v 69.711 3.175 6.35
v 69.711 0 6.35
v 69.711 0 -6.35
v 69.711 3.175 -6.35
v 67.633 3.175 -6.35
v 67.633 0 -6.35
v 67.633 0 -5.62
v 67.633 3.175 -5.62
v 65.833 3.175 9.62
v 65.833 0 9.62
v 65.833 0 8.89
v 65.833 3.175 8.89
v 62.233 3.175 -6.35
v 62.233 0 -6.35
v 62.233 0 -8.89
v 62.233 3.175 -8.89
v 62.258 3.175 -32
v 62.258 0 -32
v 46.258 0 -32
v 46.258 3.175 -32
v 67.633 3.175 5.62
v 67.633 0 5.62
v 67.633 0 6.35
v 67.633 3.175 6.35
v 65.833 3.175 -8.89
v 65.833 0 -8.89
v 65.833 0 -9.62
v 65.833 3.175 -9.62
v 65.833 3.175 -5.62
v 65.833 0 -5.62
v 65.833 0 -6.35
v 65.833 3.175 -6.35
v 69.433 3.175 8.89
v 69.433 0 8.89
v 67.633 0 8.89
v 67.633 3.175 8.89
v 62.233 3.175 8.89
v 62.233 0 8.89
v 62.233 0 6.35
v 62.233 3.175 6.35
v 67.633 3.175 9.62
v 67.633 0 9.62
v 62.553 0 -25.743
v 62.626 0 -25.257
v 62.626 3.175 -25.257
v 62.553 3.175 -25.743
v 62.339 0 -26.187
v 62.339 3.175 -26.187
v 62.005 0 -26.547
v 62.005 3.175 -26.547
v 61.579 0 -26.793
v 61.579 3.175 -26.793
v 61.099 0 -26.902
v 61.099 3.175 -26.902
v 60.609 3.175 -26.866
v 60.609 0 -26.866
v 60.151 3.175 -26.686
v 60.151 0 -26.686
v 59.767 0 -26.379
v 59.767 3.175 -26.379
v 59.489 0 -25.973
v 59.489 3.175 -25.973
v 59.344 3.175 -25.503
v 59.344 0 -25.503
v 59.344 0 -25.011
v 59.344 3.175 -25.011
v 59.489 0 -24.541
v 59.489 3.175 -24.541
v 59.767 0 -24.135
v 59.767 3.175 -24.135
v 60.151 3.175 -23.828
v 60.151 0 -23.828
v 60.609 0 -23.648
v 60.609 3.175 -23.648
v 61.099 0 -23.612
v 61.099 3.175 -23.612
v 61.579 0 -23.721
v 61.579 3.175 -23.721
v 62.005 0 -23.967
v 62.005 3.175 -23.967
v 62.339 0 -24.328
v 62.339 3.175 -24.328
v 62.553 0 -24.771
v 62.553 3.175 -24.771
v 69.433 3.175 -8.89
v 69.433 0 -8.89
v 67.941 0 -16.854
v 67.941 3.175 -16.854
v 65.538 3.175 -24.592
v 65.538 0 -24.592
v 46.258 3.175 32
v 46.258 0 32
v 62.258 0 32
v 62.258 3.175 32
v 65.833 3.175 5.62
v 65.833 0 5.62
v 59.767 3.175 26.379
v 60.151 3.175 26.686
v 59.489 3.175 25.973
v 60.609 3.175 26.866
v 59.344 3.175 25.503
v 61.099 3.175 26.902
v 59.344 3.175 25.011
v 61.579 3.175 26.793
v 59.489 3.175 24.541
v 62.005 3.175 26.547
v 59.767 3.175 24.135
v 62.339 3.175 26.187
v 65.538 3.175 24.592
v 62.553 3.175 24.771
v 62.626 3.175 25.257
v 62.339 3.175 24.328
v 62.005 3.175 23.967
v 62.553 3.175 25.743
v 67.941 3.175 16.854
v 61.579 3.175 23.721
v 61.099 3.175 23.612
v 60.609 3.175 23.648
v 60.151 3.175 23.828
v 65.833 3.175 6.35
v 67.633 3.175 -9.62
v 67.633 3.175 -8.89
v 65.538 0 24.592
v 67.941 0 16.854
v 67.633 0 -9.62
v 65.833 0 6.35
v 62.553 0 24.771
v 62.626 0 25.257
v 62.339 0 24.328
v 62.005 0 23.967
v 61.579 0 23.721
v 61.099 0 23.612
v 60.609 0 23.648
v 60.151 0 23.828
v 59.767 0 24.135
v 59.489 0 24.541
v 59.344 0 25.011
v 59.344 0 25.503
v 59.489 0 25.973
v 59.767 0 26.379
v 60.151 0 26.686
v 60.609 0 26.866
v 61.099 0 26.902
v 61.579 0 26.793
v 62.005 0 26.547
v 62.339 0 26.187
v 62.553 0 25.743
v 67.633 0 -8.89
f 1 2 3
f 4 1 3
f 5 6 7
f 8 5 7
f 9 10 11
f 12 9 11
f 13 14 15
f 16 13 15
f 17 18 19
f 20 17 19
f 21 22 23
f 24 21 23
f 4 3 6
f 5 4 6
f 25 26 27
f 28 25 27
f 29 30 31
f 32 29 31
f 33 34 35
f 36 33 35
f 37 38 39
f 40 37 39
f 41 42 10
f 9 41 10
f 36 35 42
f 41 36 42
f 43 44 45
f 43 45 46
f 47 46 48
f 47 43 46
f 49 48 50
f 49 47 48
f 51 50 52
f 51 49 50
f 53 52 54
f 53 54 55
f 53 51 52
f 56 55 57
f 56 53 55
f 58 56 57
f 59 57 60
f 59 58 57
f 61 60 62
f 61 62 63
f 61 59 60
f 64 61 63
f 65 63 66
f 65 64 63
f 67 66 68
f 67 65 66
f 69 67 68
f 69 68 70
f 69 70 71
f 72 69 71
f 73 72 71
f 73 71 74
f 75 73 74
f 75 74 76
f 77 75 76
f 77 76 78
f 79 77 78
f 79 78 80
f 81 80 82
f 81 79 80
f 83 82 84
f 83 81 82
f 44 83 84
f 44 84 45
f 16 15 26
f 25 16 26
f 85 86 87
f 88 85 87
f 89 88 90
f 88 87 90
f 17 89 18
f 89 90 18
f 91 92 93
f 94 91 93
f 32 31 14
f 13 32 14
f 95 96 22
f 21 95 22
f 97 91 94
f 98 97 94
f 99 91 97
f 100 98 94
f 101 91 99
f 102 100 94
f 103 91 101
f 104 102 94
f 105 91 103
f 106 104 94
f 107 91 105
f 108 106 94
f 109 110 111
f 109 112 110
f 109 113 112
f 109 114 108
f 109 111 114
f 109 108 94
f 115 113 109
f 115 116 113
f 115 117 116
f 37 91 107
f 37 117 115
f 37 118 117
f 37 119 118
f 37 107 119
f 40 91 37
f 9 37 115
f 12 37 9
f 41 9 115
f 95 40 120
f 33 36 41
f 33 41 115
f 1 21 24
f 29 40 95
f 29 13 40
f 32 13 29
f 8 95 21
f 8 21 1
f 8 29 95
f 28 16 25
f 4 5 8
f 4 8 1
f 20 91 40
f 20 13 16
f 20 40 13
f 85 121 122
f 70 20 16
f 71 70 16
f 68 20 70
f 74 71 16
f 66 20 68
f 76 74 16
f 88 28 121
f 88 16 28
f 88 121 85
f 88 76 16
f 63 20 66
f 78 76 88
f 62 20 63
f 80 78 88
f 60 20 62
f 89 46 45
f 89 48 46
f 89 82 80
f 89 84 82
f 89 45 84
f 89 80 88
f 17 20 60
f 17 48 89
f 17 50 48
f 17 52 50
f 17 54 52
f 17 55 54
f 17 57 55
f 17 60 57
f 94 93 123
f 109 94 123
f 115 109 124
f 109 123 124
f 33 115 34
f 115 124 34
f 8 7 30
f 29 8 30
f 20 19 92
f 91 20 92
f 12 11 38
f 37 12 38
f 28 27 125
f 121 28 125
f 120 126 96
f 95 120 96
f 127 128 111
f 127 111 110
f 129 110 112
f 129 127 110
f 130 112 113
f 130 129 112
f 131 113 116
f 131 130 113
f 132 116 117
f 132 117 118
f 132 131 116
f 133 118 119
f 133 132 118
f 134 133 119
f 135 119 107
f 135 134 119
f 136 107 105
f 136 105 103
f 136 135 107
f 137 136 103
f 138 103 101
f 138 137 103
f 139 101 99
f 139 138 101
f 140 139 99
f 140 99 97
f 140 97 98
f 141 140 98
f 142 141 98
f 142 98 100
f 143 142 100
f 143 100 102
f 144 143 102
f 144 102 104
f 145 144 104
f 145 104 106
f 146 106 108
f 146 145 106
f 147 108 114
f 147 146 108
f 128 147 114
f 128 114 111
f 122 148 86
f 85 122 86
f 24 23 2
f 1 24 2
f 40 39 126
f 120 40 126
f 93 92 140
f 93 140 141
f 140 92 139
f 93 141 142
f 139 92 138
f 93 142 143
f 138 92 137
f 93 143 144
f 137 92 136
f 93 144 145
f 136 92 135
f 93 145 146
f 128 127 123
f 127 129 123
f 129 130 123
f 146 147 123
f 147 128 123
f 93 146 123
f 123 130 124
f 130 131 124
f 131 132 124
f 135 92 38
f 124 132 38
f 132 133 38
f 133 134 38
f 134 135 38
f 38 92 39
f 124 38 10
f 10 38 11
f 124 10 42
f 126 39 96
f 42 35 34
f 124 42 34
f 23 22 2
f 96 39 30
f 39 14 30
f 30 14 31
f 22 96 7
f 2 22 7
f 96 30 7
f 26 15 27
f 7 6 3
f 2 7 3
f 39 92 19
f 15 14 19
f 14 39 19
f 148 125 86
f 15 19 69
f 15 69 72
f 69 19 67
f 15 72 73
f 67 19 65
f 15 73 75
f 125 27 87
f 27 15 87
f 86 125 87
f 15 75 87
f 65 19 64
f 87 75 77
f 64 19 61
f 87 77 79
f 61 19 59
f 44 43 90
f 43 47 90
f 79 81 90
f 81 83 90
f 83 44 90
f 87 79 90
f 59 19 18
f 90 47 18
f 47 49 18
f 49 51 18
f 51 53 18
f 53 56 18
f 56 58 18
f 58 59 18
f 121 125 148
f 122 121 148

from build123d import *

# Parameters (mm, degrees)
SKETCH1_R           = 1.65
BOSS_EXTRUDE1_DEPTH = 3.175


with BuildPart() as part:
    # Sketch1 → Boss-Extrude1 (new body)
    with BuildSketch(Plane(origin=(0, 0, 0), x_dir=(1, 0, 0), z_dir=(0, 1, 0))):
        with BuildLine():
            Line((62.257529665, 32), (46.257529665, 32))
            Line((46.257529665, 32), (46.257529665, -32))
            Line((46.257529665, -32), (62.257529665, -32))
            ThreePointArc((62.257529665, -32), (66.851547843, -20.757421588), (69.43319019, -8.89))
            Line((69.43319019, -8.89), (67.63319019, -8.89))
            Line((67.63319019, -8.89), (67.63319019, -9.62))
            Line((67.63319019, -9.62), (65.83319019, -9.62))
            Line((65.83319019, -9.62), (65.83319019, -8.89))
            Line((65.83319019, -8.89), (62.23319019, -8.89))
            Line((62.23319019, -8.89), (62.23319019, -6.35))
            Line((62.23319019, -6.35), (65.83319019, -6.35))
            Line((65.83319019, -6.35), (65.83319019, -5.62))
            Line((65.83319019, -5.62), (67.63319019, -5.62))
            Line((67.63319019, -5.62), (67.63319019, -6.35))
            Line((67.63319019, -6.35), (69.711387162, -6.35))
            Line((69.711387162, -6.35), (69.711387162, 6.35))
            Line((69.711387162, 6.35), (67.63319019, 6.35))
            Line((67.63319019, 6.35), (67.63319019, 5.62))
            Line((67.63319019, 5.62), (65.83319019, 5.62))
            Line((65.83319019, 5.62), (65.83319019, 6.35))
            Line((65.83319019, 6.35), (62.23319019, 6.35))
            Line((62.23319019, 6.35), (62.23319019, 8.89))
            Line((62.23319019, 8.89), (65.83319019, 8.89))
            Line((65.83319019, 8.89), (65.83319019, 9.62))
            Line((65.83319019, 9.62), (67.63319019, 9.62))
            Line((67.63319019, 9.62), (67.63319019, 8.89))
            Line((67.63319019, 8.89), (69.43319019, 8.89))
            ThreePointArc((69.43319019, 8.89), (66.851547843, 20.757421588), (62.257529665, 32))
        make_face()
        with Locations((60.976049146, -25.257106536)):
            Circle(SKETCH1_R, mode=Mode.SUBTRACT)
        with Locations((60.976049146, 25.257106536)):
            Circle(SKETCH1_R, mode=Mode.SUBTRACT)
    extrude(amount=BOSS_EXTRUDE1_DEPTH)


solid = part.part
